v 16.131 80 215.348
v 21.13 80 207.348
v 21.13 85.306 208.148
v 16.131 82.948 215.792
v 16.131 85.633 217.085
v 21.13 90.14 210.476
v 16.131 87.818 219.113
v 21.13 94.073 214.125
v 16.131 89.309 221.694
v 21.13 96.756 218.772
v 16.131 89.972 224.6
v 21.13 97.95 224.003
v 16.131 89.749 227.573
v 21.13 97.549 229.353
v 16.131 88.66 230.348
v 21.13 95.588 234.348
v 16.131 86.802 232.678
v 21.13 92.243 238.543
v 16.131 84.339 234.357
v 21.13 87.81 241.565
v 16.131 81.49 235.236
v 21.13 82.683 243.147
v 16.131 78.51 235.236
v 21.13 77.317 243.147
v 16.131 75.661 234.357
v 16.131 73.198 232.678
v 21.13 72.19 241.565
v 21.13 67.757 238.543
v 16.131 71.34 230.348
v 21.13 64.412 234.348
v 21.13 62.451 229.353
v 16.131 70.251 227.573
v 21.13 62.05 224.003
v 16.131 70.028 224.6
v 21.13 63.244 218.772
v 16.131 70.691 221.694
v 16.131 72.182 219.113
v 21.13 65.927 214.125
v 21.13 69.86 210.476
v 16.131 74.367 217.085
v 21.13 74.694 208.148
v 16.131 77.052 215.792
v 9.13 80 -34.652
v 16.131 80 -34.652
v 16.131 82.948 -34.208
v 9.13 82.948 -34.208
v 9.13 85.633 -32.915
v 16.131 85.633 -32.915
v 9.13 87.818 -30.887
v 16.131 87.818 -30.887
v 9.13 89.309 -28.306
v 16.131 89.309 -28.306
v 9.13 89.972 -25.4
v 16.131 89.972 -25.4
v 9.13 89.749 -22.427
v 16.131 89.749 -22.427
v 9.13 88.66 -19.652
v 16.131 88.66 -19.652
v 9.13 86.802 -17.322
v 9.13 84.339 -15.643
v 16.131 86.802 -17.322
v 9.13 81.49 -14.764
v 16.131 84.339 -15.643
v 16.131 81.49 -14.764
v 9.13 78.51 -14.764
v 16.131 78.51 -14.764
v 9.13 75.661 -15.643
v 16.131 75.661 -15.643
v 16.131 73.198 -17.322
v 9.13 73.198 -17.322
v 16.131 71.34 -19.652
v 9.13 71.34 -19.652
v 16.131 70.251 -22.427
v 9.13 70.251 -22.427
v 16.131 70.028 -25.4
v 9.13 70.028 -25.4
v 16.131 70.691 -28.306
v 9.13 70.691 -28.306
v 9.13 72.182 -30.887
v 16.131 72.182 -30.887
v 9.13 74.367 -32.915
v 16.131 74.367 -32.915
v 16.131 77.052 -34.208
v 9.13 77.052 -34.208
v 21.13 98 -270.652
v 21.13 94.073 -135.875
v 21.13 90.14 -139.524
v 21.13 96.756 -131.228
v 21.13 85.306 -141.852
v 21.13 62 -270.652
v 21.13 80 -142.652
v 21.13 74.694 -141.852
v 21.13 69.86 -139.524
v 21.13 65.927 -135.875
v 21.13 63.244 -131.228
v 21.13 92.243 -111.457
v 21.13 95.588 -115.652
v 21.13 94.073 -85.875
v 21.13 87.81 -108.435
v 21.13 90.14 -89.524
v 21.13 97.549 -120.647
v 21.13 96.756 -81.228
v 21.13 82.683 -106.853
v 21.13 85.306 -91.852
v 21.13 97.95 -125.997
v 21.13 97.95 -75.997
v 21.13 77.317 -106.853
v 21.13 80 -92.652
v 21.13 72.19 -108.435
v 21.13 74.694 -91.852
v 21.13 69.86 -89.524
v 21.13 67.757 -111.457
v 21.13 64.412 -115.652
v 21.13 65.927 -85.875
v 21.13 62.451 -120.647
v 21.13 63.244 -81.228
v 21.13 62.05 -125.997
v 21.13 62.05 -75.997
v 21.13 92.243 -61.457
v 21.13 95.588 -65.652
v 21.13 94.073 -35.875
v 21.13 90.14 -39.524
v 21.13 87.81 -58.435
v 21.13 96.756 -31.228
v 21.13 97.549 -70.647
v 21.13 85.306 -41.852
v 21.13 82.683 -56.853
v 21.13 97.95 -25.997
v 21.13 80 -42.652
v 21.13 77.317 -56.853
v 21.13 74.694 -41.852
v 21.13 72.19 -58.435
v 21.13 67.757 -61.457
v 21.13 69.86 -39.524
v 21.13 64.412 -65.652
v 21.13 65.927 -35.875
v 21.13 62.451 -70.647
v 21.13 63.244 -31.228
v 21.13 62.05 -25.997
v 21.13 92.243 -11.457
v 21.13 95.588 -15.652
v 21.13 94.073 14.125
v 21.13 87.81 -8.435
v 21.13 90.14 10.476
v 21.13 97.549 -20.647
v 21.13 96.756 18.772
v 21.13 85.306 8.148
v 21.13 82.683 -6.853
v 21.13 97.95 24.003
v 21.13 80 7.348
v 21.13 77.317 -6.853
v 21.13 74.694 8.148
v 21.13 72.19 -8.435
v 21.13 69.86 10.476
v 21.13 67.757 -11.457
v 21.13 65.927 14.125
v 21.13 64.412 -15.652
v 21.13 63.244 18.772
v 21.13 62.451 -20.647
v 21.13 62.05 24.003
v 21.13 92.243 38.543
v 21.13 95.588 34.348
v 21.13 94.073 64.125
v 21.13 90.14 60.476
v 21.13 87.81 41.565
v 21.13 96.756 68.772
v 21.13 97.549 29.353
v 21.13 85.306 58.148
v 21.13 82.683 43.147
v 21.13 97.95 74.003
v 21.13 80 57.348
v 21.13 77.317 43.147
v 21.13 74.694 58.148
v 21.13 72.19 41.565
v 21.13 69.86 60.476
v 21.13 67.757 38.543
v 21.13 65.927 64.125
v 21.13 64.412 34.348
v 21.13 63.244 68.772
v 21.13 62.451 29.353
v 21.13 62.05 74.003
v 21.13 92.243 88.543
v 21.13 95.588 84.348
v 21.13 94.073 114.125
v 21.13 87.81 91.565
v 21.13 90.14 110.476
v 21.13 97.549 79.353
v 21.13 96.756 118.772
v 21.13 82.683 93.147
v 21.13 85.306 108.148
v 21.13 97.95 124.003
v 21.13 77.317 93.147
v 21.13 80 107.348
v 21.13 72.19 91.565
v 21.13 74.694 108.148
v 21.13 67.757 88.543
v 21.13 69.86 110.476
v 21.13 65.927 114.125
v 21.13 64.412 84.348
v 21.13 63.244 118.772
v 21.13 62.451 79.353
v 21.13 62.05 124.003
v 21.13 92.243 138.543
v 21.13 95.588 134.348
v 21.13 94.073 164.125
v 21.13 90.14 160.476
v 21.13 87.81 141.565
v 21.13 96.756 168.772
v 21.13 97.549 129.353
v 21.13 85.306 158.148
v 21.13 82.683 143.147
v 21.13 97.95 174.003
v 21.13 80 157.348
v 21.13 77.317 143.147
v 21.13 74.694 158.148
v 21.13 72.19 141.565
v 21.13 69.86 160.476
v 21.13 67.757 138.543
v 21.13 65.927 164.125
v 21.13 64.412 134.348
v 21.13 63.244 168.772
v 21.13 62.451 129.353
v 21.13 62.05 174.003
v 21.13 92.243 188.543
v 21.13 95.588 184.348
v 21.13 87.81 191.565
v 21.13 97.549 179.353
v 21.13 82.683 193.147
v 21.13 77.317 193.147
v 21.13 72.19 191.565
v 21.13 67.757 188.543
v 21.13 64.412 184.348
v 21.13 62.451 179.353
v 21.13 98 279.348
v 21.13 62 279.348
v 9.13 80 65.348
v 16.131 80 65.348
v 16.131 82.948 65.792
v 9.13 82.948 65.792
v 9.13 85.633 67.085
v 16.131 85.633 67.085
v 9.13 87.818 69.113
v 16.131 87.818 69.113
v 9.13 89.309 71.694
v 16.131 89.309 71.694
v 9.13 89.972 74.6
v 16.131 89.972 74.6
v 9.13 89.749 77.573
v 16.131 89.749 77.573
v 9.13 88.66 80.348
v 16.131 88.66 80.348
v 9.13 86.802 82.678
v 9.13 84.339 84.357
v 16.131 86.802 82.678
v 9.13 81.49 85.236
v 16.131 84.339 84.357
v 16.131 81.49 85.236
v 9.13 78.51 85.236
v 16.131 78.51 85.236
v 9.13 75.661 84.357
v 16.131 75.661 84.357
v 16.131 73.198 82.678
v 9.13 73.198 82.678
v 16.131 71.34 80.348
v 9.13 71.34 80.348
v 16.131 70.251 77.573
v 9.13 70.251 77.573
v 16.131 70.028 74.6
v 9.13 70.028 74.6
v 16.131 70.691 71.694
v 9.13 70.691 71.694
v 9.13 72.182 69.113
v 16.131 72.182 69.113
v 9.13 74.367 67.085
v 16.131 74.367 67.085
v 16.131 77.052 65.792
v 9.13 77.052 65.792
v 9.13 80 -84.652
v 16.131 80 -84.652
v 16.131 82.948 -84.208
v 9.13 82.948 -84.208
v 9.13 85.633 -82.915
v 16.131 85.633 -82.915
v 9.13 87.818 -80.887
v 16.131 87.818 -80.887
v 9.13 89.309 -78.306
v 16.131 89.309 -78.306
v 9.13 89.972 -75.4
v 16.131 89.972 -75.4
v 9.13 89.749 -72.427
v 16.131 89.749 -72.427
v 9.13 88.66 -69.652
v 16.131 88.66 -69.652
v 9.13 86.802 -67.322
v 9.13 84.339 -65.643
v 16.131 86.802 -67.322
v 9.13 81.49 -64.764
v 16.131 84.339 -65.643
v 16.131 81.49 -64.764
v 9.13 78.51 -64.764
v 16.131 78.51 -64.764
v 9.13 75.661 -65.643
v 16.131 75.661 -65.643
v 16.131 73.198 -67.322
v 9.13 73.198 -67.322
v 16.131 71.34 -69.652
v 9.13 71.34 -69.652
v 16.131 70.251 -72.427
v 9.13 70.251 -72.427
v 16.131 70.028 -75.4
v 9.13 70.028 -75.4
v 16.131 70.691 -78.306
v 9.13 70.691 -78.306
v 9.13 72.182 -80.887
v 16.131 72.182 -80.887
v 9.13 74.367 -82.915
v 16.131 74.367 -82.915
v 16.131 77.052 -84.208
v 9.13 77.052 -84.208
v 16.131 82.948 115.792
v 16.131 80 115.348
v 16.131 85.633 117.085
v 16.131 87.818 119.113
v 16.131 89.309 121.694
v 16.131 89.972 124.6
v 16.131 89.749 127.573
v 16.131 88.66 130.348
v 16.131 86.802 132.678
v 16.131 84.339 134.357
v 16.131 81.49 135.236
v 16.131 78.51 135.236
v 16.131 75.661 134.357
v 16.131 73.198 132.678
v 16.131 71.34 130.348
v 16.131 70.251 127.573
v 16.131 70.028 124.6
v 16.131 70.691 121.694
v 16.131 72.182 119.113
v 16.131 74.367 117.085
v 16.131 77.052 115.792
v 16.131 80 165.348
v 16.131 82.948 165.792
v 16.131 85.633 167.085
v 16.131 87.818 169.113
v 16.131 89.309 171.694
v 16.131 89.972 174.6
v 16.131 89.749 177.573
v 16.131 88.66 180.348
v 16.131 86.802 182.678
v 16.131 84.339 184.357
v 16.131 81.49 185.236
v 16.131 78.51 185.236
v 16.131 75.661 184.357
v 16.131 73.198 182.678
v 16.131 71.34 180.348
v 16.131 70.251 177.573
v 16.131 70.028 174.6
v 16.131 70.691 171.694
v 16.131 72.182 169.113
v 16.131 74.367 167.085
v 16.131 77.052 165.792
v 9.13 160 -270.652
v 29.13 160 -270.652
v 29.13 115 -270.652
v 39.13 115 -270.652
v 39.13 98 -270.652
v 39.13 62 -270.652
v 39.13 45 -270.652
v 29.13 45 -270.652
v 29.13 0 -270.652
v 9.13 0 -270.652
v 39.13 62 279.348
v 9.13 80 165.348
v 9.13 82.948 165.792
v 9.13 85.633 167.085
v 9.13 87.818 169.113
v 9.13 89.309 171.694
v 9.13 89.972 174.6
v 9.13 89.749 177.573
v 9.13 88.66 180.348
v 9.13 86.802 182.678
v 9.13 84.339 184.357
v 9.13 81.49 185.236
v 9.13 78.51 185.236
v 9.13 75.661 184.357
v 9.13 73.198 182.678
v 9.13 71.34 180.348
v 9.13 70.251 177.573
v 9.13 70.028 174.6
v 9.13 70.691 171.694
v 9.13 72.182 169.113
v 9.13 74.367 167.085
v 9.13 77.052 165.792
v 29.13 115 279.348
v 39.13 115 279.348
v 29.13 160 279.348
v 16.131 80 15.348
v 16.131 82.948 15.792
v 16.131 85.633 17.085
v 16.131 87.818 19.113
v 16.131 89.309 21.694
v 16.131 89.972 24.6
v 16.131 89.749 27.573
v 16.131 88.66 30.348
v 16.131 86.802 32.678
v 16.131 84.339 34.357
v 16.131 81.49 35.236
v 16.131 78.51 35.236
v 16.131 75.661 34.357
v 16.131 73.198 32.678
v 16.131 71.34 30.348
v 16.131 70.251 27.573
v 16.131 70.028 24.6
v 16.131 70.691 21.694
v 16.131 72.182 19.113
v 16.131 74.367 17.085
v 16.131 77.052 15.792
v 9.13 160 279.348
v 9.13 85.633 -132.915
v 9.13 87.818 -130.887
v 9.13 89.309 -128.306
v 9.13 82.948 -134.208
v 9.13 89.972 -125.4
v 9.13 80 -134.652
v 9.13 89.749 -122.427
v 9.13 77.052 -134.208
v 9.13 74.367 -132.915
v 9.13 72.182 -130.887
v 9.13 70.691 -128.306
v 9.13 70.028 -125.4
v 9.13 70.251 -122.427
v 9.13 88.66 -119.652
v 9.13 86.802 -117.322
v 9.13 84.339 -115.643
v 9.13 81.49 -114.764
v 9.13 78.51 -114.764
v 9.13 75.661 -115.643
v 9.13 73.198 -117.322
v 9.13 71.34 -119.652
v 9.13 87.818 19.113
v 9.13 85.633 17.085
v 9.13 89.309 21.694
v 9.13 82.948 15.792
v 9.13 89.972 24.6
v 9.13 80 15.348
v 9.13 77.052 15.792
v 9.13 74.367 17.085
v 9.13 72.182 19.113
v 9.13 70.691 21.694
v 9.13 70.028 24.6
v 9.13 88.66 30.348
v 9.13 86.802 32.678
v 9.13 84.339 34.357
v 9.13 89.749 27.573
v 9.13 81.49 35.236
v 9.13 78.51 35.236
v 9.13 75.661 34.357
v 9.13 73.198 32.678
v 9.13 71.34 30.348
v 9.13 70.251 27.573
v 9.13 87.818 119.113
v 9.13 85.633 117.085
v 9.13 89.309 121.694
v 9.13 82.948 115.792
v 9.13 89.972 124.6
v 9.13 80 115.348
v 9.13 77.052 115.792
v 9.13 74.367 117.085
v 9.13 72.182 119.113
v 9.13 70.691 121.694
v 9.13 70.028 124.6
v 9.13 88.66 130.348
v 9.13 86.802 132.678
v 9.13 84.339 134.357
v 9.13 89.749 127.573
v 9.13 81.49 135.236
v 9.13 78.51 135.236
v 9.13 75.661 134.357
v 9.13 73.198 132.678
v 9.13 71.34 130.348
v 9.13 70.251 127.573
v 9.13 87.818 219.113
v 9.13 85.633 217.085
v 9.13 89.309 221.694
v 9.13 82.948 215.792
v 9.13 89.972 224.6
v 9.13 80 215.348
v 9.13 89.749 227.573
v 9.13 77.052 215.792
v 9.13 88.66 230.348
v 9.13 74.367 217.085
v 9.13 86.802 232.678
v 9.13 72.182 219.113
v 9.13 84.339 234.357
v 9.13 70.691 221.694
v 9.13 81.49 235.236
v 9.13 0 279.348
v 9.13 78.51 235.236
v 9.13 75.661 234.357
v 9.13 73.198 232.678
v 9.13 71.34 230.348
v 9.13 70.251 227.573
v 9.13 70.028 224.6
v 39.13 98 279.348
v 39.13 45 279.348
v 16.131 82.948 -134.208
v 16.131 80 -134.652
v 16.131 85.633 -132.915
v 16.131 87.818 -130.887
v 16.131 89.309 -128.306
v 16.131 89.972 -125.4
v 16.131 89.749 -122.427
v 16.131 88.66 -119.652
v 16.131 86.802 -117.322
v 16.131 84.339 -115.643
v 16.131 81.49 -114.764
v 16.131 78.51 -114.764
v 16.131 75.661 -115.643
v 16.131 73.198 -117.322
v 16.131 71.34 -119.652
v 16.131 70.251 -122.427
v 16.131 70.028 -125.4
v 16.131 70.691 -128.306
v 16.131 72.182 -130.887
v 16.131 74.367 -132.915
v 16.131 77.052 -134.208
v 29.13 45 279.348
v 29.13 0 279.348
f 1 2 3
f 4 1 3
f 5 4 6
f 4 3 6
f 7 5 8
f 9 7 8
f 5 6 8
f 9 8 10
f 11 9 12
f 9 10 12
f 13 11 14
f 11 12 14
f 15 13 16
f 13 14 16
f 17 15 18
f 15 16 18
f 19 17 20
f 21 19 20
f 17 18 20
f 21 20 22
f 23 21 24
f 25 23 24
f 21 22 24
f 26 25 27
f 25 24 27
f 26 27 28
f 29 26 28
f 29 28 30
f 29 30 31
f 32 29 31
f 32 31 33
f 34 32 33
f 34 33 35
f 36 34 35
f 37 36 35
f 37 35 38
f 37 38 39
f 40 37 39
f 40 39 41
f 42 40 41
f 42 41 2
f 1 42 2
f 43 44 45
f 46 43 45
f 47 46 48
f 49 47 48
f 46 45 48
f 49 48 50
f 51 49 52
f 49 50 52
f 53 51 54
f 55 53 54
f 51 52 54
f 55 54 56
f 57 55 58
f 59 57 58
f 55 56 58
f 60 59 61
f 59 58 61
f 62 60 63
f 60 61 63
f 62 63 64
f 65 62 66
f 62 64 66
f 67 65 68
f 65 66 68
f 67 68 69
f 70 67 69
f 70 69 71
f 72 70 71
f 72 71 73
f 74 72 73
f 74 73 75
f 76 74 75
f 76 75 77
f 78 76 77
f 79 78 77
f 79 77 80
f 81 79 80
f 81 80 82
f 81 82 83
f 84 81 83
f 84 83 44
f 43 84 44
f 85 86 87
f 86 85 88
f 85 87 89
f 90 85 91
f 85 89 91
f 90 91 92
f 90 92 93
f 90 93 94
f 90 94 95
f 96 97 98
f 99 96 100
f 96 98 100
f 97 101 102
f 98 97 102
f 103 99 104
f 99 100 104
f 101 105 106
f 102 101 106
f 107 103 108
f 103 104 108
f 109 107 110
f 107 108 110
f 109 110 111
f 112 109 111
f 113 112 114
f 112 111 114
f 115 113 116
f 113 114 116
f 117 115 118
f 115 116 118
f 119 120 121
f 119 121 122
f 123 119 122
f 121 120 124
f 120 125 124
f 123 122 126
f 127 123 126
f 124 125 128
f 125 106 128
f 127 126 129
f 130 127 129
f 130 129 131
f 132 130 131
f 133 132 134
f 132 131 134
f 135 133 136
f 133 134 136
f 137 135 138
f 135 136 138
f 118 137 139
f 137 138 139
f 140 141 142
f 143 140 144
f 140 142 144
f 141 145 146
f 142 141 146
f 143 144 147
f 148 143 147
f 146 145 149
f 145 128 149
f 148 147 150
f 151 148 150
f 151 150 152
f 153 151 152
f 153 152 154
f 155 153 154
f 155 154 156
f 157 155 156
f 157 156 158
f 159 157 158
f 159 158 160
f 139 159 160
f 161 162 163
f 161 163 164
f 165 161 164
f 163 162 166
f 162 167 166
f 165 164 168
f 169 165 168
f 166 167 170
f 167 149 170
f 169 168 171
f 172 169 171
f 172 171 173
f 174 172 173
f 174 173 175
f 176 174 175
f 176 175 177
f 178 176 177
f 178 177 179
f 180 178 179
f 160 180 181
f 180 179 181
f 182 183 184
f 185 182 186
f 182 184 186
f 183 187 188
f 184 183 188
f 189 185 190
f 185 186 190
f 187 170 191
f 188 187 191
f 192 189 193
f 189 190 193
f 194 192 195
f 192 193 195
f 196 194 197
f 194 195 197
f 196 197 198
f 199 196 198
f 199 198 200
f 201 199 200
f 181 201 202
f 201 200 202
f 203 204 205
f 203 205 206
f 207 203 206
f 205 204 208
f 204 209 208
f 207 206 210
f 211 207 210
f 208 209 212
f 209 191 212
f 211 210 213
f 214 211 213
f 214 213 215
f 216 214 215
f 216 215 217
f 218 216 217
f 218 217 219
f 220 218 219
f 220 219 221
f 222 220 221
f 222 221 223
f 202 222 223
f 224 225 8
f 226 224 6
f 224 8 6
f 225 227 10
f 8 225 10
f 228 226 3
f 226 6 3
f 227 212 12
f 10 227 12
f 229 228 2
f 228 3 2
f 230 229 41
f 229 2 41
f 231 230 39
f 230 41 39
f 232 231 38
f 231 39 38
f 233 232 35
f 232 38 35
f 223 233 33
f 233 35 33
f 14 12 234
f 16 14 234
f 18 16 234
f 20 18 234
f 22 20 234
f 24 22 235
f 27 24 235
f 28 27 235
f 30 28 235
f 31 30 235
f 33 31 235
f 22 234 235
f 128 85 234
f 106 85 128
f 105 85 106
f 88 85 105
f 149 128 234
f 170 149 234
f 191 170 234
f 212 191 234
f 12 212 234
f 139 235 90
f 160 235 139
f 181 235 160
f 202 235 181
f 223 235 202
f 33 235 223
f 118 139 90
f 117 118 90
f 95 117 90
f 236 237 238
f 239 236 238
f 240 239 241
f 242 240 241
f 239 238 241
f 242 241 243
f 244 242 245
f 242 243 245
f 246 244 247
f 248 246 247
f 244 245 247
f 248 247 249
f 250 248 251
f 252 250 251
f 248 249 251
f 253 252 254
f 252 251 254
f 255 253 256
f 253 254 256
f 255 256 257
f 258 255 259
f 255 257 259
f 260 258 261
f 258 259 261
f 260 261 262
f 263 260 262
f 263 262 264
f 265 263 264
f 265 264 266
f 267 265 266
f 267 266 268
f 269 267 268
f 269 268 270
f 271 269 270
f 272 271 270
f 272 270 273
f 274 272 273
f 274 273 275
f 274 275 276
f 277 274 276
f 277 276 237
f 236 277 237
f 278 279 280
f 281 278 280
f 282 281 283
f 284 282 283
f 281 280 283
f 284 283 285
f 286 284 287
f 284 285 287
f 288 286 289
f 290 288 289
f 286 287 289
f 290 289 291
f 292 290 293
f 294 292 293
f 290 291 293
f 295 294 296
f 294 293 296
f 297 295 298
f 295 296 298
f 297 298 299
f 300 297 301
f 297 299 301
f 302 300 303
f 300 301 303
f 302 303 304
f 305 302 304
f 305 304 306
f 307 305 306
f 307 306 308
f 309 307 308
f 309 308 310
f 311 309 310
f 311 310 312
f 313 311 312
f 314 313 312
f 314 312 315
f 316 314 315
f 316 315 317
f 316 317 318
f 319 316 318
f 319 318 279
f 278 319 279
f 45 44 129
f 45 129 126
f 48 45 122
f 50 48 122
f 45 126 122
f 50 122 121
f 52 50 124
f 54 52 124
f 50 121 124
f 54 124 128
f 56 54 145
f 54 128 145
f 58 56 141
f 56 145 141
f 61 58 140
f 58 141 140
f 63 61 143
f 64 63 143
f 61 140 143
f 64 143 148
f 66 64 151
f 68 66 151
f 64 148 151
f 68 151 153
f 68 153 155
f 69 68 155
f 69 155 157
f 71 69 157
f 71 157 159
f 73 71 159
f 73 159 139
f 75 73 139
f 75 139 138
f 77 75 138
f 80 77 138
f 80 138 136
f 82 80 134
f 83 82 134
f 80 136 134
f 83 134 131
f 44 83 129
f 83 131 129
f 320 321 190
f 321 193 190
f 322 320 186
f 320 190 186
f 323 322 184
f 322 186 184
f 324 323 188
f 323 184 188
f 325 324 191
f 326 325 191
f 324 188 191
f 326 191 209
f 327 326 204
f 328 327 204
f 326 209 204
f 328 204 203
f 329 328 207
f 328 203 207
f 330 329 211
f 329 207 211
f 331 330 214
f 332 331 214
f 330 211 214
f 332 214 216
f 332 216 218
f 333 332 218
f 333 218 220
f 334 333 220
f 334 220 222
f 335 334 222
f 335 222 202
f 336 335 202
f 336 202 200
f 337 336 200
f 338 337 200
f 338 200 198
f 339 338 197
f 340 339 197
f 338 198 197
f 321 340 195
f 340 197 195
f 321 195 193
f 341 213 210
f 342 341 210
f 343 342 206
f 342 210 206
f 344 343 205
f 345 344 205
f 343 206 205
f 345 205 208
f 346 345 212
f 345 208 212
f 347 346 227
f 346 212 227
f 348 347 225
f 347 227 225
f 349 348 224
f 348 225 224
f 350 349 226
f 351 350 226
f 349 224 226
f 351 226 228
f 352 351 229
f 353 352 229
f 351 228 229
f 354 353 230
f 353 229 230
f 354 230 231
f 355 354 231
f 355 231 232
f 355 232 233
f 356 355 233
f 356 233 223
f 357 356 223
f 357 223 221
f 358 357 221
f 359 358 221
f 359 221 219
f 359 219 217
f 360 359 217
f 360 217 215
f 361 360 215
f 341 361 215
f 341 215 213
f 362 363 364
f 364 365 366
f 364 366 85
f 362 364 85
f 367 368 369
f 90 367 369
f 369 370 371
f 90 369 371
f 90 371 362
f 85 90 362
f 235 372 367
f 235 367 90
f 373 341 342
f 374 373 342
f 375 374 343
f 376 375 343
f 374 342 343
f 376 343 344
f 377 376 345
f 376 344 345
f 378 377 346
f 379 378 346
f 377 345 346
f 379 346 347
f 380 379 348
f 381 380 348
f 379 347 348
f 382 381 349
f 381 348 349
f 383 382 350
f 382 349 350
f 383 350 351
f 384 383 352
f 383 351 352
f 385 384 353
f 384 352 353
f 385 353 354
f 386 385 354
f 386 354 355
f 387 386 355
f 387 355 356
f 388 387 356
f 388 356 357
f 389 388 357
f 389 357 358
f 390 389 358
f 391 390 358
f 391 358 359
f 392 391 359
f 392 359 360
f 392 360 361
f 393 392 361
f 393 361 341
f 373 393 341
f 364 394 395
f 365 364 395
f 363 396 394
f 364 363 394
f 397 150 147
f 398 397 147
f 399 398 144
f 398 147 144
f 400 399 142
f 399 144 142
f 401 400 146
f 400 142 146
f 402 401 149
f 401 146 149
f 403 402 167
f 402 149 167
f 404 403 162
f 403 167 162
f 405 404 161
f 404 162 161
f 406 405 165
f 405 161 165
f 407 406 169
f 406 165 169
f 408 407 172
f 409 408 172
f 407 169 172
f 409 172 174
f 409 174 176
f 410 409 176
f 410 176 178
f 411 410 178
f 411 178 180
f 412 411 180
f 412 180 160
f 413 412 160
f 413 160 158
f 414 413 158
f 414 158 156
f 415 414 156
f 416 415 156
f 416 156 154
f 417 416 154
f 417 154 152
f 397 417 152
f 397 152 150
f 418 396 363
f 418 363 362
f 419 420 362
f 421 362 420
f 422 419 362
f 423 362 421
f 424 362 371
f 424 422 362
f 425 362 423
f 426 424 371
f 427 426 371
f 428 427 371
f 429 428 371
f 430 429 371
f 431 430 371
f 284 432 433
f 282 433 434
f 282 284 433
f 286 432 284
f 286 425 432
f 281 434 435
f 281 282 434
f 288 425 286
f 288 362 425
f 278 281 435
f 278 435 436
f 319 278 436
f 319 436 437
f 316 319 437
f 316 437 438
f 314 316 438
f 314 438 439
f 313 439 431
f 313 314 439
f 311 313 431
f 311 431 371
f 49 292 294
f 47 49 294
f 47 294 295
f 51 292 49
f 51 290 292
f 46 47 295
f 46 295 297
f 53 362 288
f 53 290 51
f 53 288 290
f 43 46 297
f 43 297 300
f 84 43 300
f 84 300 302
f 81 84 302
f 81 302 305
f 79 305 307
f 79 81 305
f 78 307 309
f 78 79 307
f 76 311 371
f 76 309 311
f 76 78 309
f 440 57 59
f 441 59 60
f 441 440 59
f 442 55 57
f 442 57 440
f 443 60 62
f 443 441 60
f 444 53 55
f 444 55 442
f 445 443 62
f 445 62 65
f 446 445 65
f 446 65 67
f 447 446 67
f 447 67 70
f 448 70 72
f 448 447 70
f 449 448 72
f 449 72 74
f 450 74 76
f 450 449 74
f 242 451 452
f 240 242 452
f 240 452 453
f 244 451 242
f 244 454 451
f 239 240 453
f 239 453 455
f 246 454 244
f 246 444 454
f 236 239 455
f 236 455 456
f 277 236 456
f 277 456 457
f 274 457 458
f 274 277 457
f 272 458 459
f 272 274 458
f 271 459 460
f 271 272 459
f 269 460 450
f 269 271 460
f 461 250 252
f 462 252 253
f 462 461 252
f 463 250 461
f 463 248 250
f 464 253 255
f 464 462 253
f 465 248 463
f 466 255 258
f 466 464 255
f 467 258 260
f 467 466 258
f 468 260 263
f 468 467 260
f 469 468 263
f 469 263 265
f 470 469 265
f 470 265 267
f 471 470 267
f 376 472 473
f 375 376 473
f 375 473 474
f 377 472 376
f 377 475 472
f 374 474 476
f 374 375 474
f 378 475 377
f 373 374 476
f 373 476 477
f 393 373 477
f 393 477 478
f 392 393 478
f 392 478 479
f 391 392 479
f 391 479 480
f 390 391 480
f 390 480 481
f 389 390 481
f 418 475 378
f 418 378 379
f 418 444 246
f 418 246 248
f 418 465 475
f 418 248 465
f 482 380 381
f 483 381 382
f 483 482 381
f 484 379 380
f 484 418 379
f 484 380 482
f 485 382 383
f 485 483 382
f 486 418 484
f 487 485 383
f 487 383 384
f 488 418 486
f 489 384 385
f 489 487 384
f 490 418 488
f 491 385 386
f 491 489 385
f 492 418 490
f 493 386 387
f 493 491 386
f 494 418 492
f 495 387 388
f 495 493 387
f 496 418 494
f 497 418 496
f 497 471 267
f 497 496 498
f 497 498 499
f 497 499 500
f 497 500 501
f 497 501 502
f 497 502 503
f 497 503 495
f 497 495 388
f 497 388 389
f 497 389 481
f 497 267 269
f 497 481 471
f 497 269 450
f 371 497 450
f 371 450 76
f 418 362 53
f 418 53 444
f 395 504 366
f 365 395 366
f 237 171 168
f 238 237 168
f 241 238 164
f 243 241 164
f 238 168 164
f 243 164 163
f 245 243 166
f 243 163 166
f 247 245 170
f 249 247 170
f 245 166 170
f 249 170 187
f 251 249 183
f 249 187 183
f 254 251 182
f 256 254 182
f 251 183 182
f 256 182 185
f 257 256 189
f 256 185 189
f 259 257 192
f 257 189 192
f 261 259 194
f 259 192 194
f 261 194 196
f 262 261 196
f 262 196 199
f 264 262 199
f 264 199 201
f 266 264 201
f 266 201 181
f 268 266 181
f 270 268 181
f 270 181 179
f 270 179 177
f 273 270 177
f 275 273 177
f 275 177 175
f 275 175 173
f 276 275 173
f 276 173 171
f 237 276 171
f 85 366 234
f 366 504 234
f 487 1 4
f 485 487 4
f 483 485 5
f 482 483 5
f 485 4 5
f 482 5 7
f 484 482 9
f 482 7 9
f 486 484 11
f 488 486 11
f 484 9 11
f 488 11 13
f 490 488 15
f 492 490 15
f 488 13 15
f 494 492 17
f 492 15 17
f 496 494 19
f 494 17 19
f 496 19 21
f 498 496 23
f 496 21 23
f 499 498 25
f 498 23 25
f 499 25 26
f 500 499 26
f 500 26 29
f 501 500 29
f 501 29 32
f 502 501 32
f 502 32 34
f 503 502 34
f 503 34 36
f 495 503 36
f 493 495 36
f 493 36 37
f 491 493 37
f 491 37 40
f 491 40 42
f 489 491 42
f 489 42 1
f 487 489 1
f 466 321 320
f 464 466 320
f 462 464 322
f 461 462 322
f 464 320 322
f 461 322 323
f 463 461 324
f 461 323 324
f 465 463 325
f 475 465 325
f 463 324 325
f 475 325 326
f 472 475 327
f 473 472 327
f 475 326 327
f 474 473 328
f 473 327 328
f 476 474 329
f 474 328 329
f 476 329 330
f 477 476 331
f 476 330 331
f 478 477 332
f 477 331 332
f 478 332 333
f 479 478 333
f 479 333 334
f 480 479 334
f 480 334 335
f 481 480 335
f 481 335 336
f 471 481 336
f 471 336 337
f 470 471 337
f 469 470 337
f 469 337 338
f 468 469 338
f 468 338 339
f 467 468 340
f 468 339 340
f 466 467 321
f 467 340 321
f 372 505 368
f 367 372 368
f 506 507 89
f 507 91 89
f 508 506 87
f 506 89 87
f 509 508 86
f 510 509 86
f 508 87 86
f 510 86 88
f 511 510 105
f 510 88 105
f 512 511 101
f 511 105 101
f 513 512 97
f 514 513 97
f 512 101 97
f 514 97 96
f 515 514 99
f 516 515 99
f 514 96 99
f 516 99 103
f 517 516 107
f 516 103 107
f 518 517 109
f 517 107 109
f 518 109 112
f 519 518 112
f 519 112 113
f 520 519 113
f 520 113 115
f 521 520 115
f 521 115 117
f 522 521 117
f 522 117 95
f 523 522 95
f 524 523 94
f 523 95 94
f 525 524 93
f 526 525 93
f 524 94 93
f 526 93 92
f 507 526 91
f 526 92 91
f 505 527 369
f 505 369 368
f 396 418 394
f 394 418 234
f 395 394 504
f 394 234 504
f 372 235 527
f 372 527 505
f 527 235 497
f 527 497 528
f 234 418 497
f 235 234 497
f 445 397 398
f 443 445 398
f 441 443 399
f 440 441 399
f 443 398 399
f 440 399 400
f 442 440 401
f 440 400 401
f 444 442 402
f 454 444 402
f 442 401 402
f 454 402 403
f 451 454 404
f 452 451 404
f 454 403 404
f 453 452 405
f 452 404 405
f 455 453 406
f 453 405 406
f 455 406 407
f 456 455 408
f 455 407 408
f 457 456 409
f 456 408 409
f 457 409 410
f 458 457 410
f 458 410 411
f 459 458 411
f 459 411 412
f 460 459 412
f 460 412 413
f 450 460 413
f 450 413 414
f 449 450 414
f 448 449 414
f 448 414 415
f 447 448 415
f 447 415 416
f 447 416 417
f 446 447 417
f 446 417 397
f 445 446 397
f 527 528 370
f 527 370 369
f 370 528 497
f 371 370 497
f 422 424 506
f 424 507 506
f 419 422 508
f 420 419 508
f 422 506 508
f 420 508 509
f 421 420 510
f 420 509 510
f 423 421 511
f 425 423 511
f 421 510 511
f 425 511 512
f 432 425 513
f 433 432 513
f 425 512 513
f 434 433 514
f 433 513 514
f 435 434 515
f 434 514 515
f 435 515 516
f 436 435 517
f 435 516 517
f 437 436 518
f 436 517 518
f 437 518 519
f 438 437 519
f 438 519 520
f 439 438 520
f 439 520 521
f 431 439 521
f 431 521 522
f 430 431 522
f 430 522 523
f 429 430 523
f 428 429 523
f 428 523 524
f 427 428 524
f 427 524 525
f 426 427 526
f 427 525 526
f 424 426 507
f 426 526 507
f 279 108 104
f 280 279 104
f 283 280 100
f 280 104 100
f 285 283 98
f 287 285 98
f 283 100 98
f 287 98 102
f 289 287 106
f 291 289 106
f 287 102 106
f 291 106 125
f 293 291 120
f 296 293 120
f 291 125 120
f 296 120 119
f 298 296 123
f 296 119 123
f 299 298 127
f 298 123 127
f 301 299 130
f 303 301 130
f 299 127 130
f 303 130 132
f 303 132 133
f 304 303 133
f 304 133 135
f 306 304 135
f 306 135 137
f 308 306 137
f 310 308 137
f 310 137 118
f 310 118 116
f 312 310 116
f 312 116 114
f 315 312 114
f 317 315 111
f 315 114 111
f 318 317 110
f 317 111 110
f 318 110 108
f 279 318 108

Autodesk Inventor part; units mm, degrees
ref_plane "YZ Plane" through (0, 0, 0) normal (1, 0, 0) x (0, 1, 0)
ref_plane "XZ Plane" through (0, 0, 0) normal (0, 1, 0) x (-1, 0, 0)
ref_plane "XY Plane" through (0, 0, 0) normal (0, 0, 1) x (1, 0, 0)
sketch "Sketch1" plane through (0, 0, 0) normal (0, 1, 0) x (-1, 0, 0)
  line L0 (0, 279.3478) -> (-39.1304, 279.3478)
  line L1 (-39.1304, 279.3478) -> (-39.1304, -270.6522)
  line L2 (-39.1304, -270.6522) -> (0, -270.6522)
  line L3 (0, -270.6522) -> (0, 279.3478)
  line L4 (-39.1304, 279.3478) -> (-29.1304, 279.3478)
  line L5 (-29.1304, 254.3478) -> (-39.1304, 254.3478)
  line L6 (-39.1304, 254.3478) -> (-39.1304, 279.3478)
  line L7 (-39.1304, -270.6522) -> (-29.1304, -270.6522)
  line L8 (-29.1304, -245.6522) -> (-39.1304, -245.6522)
  line L9 (-39.1304, -245.6522) -> (-39.1304, -270.6522)
  point P0 (0, 0)
  point P1 (-39.1304, 254.3478)
  point P2 (-39.1304, -245.6522)
  dimension "d0" = 550
  dimension "d4" = 25
  dimension "d5" = 25
  dimension "d28" = 39.1304
extrude "Extrusion1" add sketch "Sketch1" along normal blind 160
sketch "Sketch2" plane through (0, 0, 279.3478) normal (0, 0, 1) x (1, 0, 0)
  line L0 (0, 160) -> (39.1304, 160) projected
  line L1 (0, 160) -> (39.1304, 160)
  line L2 (39.1304, 160) -> (39.1304, 0)
  line L3 (39.1304, 0) -> (0, 0)
  line L4 (0, 0) -> (0, 160)
  line L5 (39.1304, 160) -> (29.1304, 160)
  line L6 (29.1304, 160) -> (29.1304, 115)
  line L7 (29.1304, 115) -> (39.1304, 115)
  line L8 (39.1304, 115) -> (39.1304, 160)
  line L9 (39.1304, 0) -> (29.1304, 0)
  line L10 (29.1304, 0) -> (29.1304, 45)
  line L11 (29.1304, 45) -> (39.1304, 45)
  line L12 (39.1304, 45) -> (39.1304, 0)
  circle A0 centre (39.1304, 80) radius 18
  line L13 (21.1304, 75) -> (39.1304, 75)
  line L14 (39.1304, 75) -> (39.1304, 98)
  line L15 (39.1304, 98) -> (21.1304, 98)
  line L16 (21.1304, 98) -> (21.1304, 75)
  line L17 (21.1304, 75) -> (39.1304, 75)
  line L18 (39.1304, 75) -> (39.1304, 62)
  line L19 (39.1304, 62) -> (21.1304, 62)
  line L20 (21.1304, 62) -> (21.1304, 75)
  line L21 (39.1304, 0) -> (39.1304, 160) projected
  line L22 (0, 160) -> (9.1304, 160)
  line L23 (9.1304, 160) -> (9.1304, 0)
  line L24 (9.1304, 0) -> (0, 0)
  line L25 (0, 0) -> (0, 160)
  point P0 (0, 0)
  point P1 (34.1304, 115)
  point P2 (34.1304, 160)
  point P3 (39.1304, 45)
  point P4 (39.1304, 115)
  dimension "d6" = 10
  dimension "d7" = 45
  dimension "d8" = 45
  dimension "d9" = 18
  dimension "d10" = 36
  dimension "d11" = 80
  dimension "d12" = 80
  dimension "d15" = 30
extrude "Extrusion2" cut sketch "Sketch2" against normal up to surface (550 mm away) contours L0 L23 L3 L4 | L0 L2 L7 L6 | L10 L11 L2 L3 | L2 L13 A0 | A0 L16 L15 | L2 A0 L13 | A0 L13 L16 | L19 L20 L13 A0
sketch "Sketch3" plane through (21.1304, 62, 279.3478) normal (1, 0, 0) x (0, 0, -1)
  line L0 (550, 0) -> (0, 0) projected
  line L1 (0, 0) -> (0, 36) projected
  line L2 (0, 36) -> (550, 36) projected
  circle A0 centre (54, 18) radius 10
  circle A1 centre (104, 18) radius 10
  circle A2 centre (154, 18) radius 10
  circle A3 centre (204, 18) radius 10
  circle A4 centre (254, 18) radius 10
  circle A5 centre (304, 18) radius 10
  circle A6 centre (354, 18) radius 10
  circle A7 centre (404, 18) radius 10
  circle A8 centre (454, 18) radius 10
  point P0 (279.3478, -62)
  dimension "d18" = 50
extrude "Extrusion3" cut sketch "Sketch3" against normal blind 25 contours A0 | A1 | A2 | A3 | A4 | A5 | A6 | A7
chamfer "Chamfer1" distance 8 distance2 5 8 edges at (21.1304, 80, 235.3478) (21.1304, 80, 185.3478) (21.1304, 80, 135.3478) (21.1304, 80, 85.3478) (21.1304, 80, 35.3478) (21.1304, 80, -14.6522) (21.1304, 80, -64.6522) (21.1304, 80, -114.6522) measured on face at (21.1304, 80, -225.3188)
properties part number "MainRails" material "Aluminum 6061"
